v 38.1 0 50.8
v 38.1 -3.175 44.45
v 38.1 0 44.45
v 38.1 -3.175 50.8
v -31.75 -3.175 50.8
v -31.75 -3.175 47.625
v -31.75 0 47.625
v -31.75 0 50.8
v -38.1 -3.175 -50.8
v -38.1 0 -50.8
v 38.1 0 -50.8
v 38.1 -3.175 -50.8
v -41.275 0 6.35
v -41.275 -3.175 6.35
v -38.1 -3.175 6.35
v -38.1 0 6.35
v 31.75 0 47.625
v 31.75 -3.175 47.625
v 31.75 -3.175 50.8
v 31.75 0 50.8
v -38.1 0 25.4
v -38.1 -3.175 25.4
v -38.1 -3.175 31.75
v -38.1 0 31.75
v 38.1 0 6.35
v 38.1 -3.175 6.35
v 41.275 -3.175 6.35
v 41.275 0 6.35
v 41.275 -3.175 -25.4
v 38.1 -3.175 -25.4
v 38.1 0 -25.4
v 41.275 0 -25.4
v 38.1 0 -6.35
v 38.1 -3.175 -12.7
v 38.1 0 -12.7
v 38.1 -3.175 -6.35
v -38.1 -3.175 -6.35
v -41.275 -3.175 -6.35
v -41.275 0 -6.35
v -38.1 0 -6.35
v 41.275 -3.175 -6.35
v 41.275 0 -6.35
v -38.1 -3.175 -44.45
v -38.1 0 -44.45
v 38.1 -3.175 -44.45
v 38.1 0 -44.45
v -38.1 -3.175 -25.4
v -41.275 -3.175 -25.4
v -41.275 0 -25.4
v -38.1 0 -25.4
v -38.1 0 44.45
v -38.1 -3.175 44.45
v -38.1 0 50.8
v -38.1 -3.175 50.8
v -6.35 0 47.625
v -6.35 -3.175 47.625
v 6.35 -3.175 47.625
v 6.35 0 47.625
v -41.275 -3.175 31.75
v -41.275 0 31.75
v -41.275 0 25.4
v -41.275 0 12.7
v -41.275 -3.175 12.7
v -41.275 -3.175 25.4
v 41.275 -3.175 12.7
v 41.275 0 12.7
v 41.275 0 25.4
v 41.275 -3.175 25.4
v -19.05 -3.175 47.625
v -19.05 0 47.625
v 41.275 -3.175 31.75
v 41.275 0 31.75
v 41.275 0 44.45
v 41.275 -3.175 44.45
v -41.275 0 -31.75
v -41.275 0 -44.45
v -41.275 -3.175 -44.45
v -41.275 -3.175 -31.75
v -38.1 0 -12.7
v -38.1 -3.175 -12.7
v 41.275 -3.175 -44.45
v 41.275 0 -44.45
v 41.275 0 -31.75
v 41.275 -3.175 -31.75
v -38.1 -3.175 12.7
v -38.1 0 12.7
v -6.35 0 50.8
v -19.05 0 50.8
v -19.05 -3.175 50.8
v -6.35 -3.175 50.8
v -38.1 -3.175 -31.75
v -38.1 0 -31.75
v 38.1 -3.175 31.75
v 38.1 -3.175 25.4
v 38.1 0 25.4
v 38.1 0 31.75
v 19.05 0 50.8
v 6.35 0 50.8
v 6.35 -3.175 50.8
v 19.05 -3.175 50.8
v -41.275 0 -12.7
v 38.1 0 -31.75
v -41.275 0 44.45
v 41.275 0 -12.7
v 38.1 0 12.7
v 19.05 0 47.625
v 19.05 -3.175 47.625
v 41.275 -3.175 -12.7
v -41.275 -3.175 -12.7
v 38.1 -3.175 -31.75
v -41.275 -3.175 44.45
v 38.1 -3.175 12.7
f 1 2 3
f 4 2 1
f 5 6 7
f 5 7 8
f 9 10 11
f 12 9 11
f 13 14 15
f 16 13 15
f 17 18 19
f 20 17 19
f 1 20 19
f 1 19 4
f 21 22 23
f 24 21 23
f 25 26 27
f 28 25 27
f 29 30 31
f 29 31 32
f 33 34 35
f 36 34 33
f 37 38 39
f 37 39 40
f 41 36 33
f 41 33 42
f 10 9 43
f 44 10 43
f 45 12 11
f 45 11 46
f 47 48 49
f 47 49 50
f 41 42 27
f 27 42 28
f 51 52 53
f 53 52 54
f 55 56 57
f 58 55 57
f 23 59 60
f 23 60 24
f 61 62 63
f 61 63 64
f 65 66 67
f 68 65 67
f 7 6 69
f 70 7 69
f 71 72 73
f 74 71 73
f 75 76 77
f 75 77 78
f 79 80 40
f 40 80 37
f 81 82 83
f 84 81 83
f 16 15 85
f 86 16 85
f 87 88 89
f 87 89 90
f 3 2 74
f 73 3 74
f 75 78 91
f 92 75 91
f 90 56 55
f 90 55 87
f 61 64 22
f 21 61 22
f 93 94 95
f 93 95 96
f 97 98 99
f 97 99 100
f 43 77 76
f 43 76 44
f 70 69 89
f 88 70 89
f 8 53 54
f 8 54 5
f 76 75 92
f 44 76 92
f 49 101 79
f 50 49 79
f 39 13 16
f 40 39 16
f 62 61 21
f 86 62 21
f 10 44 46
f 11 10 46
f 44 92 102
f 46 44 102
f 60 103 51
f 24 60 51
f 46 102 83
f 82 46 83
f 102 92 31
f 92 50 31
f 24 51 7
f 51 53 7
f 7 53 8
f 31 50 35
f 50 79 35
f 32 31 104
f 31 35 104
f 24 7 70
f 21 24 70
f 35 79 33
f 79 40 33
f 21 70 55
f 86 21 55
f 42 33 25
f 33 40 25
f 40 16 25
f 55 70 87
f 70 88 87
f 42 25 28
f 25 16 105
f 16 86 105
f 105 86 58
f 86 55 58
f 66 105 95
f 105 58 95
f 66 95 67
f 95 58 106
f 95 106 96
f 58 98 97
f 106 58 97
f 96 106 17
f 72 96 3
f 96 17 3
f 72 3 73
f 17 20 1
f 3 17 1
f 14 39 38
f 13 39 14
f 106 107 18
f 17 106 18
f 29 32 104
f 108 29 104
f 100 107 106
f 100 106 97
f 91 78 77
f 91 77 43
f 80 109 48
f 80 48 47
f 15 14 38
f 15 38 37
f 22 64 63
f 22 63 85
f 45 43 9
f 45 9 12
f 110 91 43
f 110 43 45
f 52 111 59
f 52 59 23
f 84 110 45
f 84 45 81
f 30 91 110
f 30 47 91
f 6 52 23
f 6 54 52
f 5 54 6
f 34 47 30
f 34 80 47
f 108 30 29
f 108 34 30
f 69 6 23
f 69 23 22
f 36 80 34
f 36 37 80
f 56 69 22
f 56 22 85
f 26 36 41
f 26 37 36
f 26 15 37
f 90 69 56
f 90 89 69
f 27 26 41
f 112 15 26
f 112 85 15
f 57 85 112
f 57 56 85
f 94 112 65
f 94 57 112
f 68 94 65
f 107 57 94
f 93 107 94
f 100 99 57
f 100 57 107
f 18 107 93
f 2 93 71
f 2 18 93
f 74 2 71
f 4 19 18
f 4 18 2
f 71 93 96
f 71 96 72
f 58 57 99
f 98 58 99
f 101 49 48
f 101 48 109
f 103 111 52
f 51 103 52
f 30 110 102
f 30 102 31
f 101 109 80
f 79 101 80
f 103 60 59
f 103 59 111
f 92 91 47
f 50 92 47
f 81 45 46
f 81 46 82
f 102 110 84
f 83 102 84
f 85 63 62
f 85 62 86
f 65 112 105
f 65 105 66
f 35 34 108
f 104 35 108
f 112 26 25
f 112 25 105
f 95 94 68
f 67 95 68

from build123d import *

# Parameters (mm, degrees)
F0_W     = 82.55
F0_H     = 101.6
F1_DEPTH = 3.175
F2_W     = 3.175
F2_H     = 6.35
F3_DEPTH = 3.176
F4_W     = 12.7
F4_H     = 3.175
F5_DEPTH = 3.176


with BuildPart() as f1:
    # F0 (on Front) → F1 (new body)
    with BuildSketch(Plane.XZ):
        Rectangle(F0_W, F0_H)
    extrude(amount=F1_DEPTH)

    # F2 (on face) → F3 (cut, through all)
    with BuildSketch(Plane.XZ.offset(3.175)):
        with Locations((-39.6875, -47.625)):
            Rectangle(F2_W, F2_H)
        with Locations((-39.6875, -28.575)):
            Rectangle(F2_W, F2_H)
        with Locations((-39.6875, -9.525)):
            Rectangle(F2_W, F2_H)
        with Locations((-39.6875, 9.525)):
            Rectangle(F2_W, F2_H)
        with Locations((-39.6875, 28.575)):
            Rectangle(F2_W, F2_H)
        with Locations((-39.6875, 47.625)):
            Rectangle(F2_W, F2_H)
        with Locations((39.6875, -47.625)):
            Rectangle(F2_W, F2_H)
        with Locations((39.6875, -9.525)):
            Rectangle(F2_W, F2_H)
        with Locations((39.6875, 9.525)):
            Rectangle(F2_W, F2_H)
        with Locations((39.6875, -28.575)):
            Rectangle(F2_W, F2_H)
        with Locations((39.6875, 28.575)):
            Rectangle(F2_W, F2_H)
        with Locations((39.6875, 47.625)):
            Rectangle(F2_W, F2_H)
    extrude(amount=-F3_DEPTH, mode=Mode.SUBTRACT)

    # F4 (on face) → F5 (cut, through all)
    with BuildSketch(Plane.XZ.offset(3.175)):
        with Locations((-25.4, 49.2125)):
            Rectangle(F4_W, F4_H)
        with Locations((0, 49.2125)):
            Rectangle(F4_W, F4_H)
        with Locations((25.4, 49.2125)):
            Rectangle(F4_W, F4_H)
    extrude(amount=-F5_DEPTH, mode=Mode.SUBTRACT)


solid = f1.part
